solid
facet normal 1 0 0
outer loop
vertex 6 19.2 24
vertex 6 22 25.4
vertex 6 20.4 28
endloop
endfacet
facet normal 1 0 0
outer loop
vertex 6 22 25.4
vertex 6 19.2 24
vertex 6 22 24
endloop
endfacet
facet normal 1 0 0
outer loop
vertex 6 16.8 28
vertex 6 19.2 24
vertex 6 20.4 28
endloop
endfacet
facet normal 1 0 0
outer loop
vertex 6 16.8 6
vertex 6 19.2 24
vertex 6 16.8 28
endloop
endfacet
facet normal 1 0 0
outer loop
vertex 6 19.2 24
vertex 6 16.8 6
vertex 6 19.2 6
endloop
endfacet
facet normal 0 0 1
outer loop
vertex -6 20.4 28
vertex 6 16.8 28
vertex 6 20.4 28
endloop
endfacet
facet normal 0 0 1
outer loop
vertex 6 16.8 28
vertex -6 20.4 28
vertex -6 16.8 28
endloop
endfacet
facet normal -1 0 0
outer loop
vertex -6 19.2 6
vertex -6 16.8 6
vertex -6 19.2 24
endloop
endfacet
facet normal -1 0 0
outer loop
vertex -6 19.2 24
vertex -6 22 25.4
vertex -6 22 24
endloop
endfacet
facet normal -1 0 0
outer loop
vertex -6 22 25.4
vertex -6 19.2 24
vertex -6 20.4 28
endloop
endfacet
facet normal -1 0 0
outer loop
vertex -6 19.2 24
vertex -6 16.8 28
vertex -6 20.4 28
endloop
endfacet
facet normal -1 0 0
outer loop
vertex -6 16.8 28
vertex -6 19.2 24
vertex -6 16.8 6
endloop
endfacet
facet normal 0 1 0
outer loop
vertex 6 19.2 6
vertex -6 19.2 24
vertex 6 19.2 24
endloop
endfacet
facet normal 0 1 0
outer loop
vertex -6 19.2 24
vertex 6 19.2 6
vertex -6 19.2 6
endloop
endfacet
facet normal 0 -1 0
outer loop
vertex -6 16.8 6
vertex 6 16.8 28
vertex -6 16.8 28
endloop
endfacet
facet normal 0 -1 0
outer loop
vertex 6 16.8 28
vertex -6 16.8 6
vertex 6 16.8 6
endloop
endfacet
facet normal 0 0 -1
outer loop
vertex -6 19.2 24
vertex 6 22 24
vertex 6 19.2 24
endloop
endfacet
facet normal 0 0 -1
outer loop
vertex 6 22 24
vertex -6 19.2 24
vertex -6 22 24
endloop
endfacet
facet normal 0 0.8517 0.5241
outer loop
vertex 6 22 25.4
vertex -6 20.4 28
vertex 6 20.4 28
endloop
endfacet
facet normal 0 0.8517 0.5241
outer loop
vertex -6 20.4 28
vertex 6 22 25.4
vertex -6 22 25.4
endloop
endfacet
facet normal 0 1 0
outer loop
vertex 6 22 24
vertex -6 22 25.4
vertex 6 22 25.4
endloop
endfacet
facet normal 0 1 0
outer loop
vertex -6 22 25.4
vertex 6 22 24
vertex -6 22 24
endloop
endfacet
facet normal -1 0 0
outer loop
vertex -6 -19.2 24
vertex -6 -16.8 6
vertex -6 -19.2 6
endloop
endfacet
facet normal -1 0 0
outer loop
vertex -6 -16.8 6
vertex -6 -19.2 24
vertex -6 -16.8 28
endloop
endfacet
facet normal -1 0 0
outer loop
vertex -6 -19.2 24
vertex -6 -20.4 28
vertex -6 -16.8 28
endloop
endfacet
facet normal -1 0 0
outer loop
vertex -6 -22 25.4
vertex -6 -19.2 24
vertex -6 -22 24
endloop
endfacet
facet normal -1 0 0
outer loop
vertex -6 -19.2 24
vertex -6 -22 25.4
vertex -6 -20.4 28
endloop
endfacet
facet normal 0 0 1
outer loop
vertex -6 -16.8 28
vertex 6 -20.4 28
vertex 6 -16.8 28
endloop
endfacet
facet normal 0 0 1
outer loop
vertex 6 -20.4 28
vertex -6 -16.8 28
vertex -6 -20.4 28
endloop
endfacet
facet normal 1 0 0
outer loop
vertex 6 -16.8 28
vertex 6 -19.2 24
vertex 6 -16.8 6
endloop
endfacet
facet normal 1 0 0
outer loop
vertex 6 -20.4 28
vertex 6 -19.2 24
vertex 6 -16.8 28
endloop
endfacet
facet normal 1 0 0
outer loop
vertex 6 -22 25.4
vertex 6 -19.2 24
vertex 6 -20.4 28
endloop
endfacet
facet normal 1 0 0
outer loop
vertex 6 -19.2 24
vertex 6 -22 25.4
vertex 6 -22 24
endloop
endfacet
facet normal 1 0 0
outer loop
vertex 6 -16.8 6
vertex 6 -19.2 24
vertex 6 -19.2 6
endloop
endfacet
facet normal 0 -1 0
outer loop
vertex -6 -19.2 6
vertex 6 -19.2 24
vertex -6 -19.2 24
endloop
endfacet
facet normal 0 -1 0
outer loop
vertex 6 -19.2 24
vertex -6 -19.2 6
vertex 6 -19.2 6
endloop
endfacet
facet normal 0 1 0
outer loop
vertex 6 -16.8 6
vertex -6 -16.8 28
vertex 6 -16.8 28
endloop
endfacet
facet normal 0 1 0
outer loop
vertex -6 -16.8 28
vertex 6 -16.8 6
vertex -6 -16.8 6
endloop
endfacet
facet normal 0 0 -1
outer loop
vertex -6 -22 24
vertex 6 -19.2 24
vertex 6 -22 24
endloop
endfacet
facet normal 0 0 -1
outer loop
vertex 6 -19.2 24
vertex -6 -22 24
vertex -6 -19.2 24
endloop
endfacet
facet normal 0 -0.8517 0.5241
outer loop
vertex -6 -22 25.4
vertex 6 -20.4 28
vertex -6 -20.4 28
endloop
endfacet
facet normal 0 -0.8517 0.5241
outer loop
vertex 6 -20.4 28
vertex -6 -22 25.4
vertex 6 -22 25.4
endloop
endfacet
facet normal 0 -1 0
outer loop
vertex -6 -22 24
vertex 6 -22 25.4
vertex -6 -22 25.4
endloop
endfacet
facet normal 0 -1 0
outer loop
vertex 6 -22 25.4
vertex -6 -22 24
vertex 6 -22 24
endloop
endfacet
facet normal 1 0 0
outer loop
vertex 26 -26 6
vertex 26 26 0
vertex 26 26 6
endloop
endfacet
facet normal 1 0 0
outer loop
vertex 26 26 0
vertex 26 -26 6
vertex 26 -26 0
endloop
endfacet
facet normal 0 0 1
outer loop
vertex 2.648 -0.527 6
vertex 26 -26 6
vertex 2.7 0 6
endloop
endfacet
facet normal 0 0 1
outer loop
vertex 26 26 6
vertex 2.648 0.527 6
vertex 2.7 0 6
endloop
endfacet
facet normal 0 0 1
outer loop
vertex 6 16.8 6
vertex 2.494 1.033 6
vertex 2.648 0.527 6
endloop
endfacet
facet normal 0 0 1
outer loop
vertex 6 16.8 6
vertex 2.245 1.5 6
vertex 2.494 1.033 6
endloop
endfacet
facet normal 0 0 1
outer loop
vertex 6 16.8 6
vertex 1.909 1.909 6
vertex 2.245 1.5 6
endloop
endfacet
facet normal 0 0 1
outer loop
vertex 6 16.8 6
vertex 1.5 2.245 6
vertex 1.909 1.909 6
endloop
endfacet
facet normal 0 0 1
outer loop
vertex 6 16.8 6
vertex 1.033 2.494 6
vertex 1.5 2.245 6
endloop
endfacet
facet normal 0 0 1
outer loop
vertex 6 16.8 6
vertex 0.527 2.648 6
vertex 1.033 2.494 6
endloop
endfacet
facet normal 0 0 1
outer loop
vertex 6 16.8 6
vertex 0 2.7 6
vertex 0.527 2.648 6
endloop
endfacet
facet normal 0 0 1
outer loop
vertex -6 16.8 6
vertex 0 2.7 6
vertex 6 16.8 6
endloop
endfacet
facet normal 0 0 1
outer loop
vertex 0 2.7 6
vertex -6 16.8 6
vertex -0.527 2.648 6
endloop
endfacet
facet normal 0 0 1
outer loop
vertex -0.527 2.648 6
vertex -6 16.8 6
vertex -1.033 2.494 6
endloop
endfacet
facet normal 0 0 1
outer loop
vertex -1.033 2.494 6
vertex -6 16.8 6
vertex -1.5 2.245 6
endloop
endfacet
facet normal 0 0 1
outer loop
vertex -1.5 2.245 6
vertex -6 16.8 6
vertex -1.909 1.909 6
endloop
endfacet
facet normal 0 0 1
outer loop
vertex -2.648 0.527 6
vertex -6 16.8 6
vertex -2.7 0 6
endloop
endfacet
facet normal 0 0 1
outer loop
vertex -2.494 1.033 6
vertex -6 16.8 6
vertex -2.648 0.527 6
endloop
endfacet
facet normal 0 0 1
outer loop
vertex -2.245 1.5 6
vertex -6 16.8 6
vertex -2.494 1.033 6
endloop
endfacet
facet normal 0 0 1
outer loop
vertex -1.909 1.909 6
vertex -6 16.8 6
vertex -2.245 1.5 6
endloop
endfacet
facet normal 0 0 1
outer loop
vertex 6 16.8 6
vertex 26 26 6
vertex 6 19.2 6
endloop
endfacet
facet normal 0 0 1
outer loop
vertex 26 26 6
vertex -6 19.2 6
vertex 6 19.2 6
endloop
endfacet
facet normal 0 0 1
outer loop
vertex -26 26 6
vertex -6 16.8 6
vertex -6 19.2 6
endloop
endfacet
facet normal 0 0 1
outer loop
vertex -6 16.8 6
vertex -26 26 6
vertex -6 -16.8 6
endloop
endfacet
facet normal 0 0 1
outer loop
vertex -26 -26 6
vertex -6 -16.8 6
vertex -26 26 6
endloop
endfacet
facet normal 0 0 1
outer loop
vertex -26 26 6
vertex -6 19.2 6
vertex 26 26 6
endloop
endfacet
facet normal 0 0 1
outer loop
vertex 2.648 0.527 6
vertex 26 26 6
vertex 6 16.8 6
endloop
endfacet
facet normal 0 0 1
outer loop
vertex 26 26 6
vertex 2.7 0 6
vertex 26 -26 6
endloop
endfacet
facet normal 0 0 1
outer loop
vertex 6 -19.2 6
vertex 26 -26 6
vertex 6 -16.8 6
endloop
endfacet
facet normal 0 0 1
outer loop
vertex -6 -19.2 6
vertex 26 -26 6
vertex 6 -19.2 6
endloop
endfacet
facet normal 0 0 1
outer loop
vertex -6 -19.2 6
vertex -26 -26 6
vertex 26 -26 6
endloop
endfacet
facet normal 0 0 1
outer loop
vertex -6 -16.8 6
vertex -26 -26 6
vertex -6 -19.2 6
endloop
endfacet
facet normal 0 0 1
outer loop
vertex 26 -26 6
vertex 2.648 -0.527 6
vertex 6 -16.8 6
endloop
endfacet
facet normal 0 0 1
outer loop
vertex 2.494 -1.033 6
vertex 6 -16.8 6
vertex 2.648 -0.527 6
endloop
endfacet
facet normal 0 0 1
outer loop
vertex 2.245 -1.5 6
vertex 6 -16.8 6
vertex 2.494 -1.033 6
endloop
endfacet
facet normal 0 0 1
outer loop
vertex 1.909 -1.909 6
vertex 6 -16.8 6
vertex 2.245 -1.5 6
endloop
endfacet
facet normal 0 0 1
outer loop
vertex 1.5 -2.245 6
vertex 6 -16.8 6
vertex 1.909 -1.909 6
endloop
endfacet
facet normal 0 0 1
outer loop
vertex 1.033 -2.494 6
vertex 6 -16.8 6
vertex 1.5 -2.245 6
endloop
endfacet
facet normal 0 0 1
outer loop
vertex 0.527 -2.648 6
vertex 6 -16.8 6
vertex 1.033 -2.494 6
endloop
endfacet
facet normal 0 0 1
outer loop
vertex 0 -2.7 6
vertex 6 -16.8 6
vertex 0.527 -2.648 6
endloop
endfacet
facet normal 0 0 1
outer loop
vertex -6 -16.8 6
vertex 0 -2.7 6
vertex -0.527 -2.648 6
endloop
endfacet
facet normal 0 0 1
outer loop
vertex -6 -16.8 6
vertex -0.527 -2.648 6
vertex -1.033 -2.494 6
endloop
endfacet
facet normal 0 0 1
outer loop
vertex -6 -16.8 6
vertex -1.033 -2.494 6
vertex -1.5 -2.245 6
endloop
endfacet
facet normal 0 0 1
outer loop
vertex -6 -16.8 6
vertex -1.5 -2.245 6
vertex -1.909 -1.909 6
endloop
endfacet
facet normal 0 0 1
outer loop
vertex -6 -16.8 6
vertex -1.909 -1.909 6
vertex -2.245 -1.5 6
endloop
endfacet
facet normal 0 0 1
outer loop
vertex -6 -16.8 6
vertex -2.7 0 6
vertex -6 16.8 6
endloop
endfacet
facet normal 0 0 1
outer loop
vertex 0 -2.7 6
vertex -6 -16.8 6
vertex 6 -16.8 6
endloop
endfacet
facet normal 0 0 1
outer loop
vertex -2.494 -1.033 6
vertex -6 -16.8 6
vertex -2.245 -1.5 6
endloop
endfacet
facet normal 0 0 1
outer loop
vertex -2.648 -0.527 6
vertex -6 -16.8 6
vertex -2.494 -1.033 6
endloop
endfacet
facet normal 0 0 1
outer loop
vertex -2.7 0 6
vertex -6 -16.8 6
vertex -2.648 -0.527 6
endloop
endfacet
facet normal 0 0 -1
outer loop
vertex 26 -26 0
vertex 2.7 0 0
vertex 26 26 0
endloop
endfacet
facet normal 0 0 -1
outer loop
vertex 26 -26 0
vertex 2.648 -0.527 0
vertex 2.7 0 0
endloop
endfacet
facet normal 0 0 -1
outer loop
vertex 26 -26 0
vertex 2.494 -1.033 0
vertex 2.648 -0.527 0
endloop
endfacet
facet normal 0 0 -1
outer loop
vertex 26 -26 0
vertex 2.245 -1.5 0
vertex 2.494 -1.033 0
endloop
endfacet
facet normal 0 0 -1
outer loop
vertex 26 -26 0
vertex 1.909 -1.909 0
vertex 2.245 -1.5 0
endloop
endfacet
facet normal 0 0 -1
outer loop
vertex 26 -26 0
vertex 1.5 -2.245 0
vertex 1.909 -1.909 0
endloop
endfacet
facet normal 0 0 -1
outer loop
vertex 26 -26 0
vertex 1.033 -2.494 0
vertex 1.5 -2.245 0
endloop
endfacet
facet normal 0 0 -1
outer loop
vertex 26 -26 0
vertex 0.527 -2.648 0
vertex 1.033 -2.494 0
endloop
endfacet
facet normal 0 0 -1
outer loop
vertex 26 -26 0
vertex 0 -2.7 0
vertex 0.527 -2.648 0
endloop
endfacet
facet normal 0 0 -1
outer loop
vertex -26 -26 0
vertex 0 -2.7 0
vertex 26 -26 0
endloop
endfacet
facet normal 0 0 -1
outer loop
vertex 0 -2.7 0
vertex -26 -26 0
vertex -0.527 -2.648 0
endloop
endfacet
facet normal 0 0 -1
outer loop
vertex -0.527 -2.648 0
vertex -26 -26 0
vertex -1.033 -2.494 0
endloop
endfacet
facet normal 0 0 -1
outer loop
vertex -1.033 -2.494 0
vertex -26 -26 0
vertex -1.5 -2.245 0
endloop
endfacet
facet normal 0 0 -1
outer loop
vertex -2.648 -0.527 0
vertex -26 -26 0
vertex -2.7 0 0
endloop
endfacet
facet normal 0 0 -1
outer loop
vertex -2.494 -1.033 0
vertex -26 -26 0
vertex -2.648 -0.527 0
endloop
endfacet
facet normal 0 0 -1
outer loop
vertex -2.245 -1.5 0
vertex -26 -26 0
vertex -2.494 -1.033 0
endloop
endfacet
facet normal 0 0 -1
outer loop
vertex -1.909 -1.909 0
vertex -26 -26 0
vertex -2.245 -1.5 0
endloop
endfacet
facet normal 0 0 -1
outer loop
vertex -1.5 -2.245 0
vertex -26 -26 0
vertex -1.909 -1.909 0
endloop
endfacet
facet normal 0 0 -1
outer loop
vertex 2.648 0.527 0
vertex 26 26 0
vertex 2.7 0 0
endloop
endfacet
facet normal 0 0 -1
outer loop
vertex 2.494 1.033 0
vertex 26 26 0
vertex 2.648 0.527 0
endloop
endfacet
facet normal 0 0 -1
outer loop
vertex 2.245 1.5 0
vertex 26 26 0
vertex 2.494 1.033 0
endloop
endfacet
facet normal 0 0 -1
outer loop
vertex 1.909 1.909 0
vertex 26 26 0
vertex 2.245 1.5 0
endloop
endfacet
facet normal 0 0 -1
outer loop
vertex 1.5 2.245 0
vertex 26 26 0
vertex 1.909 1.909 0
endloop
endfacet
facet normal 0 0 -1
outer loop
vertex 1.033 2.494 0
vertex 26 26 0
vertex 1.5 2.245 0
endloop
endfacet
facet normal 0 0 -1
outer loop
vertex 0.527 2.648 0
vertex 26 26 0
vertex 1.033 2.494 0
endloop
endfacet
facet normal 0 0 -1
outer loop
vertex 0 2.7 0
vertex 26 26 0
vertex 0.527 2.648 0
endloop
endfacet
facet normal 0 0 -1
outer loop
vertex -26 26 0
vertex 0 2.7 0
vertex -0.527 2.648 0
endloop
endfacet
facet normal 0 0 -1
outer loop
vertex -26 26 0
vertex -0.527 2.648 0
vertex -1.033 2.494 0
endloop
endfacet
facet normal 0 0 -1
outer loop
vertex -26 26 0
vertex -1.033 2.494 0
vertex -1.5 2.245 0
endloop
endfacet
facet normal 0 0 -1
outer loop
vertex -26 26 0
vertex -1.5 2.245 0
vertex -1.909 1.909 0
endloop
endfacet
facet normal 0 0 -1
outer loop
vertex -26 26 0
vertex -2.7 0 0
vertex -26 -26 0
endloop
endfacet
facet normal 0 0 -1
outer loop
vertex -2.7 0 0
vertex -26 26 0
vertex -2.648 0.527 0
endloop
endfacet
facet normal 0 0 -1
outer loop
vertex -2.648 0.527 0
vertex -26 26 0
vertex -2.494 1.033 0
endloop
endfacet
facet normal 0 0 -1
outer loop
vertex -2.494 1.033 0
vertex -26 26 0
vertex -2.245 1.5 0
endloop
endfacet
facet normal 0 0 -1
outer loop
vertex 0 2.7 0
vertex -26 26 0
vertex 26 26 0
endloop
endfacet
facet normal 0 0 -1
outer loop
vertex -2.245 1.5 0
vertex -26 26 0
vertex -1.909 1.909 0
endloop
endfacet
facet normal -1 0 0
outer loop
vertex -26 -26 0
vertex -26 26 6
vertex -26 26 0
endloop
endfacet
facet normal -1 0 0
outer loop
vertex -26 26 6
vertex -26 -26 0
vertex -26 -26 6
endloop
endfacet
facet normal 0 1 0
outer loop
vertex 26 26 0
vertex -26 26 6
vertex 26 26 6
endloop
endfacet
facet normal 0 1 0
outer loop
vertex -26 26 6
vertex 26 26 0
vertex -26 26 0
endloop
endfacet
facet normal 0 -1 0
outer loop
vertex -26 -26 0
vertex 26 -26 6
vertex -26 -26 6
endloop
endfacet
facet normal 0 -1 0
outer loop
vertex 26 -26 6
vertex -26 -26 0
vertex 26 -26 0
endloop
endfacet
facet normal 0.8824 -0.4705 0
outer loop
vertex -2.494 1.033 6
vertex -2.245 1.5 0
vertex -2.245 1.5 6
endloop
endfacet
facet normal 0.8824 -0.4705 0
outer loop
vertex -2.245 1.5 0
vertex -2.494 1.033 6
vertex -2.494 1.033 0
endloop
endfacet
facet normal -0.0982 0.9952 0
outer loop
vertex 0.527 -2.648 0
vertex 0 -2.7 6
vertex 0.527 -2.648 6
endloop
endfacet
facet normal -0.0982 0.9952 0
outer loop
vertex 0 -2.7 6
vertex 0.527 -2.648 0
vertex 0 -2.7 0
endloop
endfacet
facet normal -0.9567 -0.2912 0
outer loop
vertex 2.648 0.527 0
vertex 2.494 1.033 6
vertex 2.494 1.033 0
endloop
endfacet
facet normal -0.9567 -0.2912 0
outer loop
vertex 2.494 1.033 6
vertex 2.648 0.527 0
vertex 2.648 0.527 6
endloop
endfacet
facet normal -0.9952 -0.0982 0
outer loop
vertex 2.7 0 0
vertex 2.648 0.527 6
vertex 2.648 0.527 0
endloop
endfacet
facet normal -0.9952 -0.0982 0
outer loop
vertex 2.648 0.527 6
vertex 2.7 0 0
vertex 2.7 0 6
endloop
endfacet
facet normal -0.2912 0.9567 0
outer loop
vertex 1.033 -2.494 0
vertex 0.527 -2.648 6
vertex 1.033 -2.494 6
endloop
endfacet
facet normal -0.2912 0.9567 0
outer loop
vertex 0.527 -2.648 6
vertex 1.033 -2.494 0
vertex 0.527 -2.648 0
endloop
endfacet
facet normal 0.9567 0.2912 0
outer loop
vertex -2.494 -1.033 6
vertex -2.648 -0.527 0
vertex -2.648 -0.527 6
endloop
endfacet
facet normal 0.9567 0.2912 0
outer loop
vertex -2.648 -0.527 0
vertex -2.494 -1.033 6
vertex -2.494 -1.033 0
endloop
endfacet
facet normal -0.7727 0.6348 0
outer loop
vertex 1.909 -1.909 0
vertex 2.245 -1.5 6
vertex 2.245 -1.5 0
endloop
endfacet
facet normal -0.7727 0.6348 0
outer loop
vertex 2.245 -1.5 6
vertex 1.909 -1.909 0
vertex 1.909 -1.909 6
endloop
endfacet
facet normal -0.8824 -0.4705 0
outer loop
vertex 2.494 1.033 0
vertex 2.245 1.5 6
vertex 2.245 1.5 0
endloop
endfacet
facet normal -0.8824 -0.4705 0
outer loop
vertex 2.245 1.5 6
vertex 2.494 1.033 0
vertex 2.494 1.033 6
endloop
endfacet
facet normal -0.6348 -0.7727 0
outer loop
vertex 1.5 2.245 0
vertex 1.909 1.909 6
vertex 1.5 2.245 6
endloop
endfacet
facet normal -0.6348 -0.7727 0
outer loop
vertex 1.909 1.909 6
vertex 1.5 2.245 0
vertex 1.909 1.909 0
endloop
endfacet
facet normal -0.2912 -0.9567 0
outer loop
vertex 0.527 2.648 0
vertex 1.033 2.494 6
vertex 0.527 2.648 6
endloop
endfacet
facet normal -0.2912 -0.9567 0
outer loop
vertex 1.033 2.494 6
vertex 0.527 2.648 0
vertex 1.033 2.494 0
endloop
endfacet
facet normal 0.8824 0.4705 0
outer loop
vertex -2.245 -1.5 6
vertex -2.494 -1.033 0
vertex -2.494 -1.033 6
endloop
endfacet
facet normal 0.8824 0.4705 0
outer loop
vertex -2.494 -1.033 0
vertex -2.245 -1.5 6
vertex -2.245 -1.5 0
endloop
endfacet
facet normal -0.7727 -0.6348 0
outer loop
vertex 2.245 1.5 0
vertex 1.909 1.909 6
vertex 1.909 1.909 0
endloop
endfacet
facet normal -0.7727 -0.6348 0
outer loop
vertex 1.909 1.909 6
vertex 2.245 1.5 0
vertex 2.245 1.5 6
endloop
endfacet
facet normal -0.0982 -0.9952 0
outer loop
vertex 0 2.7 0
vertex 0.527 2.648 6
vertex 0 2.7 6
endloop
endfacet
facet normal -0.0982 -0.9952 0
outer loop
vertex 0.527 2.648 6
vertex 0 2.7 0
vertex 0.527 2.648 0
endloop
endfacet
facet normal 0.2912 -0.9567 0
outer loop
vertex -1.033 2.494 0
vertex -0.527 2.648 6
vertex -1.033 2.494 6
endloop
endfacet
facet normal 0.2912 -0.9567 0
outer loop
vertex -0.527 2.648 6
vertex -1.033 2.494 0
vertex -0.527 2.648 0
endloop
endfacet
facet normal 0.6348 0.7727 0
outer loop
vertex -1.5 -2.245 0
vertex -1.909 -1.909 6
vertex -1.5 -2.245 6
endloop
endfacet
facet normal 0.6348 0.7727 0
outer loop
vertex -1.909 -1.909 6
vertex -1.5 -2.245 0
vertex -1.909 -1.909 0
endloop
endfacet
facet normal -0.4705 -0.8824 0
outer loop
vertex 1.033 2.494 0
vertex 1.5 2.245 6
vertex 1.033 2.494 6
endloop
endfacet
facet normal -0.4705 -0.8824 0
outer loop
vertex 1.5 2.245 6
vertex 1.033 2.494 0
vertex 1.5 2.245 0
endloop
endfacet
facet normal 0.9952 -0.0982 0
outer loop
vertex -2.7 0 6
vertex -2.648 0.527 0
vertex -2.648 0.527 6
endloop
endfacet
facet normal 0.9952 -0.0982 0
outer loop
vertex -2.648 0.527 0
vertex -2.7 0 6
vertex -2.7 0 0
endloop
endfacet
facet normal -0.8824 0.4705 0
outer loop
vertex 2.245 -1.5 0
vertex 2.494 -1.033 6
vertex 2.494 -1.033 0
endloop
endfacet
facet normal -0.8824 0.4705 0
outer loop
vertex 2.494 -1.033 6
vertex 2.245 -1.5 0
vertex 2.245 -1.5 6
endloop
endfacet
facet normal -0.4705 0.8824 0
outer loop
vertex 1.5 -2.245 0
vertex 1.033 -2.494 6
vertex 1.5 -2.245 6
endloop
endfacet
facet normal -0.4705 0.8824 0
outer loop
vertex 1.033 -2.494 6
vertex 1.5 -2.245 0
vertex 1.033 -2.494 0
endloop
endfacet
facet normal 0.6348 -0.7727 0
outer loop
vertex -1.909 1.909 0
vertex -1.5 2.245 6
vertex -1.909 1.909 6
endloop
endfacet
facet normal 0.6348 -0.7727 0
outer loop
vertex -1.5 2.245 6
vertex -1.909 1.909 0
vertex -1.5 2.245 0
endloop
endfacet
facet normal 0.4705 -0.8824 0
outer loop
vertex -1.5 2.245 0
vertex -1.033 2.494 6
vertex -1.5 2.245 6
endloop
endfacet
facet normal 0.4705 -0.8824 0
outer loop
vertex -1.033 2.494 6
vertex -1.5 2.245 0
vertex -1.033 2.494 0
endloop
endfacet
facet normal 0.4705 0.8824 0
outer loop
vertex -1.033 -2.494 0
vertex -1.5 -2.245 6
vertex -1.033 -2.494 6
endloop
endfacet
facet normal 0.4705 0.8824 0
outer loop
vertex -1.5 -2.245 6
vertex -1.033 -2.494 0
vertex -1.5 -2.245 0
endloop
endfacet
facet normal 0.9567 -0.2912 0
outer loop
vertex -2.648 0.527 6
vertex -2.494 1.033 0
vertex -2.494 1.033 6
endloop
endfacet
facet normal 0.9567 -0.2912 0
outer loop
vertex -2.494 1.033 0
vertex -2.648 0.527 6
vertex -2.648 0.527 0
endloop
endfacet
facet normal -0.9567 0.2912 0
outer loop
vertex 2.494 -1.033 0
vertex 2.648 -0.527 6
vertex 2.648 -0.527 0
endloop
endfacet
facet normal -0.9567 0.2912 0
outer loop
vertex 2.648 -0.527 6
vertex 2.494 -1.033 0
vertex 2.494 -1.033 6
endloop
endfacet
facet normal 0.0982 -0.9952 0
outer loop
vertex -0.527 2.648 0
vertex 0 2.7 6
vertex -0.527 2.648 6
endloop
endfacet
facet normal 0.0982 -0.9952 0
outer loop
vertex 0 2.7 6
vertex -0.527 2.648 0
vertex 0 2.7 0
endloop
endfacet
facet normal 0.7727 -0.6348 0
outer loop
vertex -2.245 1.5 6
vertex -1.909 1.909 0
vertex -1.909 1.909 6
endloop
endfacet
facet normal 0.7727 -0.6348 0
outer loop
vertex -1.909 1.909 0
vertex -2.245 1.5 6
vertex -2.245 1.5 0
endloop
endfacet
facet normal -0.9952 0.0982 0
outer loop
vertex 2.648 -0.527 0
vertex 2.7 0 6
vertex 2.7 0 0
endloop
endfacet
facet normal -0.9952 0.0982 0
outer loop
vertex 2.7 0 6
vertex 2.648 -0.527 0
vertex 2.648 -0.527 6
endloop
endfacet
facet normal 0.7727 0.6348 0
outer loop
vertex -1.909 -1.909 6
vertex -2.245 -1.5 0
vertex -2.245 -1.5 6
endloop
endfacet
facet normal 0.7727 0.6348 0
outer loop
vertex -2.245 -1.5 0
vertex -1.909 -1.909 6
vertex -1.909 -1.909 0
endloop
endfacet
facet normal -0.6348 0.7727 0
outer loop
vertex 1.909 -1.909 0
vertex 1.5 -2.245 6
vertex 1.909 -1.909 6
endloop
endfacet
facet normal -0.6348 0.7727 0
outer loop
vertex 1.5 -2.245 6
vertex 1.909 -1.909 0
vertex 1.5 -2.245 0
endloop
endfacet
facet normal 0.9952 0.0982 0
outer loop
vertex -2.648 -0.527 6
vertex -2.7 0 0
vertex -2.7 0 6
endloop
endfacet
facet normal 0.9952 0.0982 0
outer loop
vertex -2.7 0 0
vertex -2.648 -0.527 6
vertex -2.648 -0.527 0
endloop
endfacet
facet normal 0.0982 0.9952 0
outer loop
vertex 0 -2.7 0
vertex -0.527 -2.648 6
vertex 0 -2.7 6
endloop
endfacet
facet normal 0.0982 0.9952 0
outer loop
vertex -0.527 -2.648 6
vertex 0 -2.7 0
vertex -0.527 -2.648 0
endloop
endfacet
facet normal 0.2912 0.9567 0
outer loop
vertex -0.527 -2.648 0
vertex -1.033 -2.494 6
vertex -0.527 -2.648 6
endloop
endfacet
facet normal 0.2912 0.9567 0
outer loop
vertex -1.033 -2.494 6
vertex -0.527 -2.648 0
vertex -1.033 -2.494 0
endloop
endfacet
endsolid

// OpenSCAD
$fn = 32;

// ----------------------------------------------------------------------
// Snap-fit latch: 2 arms, 22 mm tall, 3 mm undercut hooks
// ----------------------------------------------------------------------

// --- parameters (mm) ---
base_d = 52;              // base plate depth
base_h = 6;               // base plate thickness
span = 36;                // distance between opposite arms
arm_t = 2.4;              // arm thickness
arm_d = 12;               // arm width
height = 22;              // free arm length
head_len = 3;             // hook reach
head_h = 4;               // hook height
lead = 1.4;               // lead-in ramp thickness
bore_d = 5.4;             // base fixing bore
top_z = 28;               // height of the arm tips above the base

arms = 2;

difference() {
  union() {
    /* base plate, centred on the arm ring */
    translate([-26, -26, 0]) cube([base_d, base_d, base_h]);
    for (a = [0 : 360 / arms : 359]) rotate([0, 0, a]) {
    /* arm, sunk 0.5 mm into the base */
    translate([-arm_d / 2, span / 2 - arm_t / 2, base_h - 0.5]) cube([arm_d, arm_t, height + 0.5]);
    /* hook: a convex hull of a tall inner block and a thin outer lip
       gives a flat undercut below and a lead-in ramp on top */
    hull() {
      translate([-arm_d / 2, span / 2 + arm_t / 2 - 0.6, top_z - head_h]) cube([arm_d, lead + 0.4, head_h]);
      translate([-arm_d / 2, span / 2 + arm_t / 2 - 0.2, top_z - head_h]) cube([arm_d, head_len, lead]);
    }
    }
  }
  translate([0, 0, -2.5]) cylinder(h = base_h + 5, d = bore_d);
}
